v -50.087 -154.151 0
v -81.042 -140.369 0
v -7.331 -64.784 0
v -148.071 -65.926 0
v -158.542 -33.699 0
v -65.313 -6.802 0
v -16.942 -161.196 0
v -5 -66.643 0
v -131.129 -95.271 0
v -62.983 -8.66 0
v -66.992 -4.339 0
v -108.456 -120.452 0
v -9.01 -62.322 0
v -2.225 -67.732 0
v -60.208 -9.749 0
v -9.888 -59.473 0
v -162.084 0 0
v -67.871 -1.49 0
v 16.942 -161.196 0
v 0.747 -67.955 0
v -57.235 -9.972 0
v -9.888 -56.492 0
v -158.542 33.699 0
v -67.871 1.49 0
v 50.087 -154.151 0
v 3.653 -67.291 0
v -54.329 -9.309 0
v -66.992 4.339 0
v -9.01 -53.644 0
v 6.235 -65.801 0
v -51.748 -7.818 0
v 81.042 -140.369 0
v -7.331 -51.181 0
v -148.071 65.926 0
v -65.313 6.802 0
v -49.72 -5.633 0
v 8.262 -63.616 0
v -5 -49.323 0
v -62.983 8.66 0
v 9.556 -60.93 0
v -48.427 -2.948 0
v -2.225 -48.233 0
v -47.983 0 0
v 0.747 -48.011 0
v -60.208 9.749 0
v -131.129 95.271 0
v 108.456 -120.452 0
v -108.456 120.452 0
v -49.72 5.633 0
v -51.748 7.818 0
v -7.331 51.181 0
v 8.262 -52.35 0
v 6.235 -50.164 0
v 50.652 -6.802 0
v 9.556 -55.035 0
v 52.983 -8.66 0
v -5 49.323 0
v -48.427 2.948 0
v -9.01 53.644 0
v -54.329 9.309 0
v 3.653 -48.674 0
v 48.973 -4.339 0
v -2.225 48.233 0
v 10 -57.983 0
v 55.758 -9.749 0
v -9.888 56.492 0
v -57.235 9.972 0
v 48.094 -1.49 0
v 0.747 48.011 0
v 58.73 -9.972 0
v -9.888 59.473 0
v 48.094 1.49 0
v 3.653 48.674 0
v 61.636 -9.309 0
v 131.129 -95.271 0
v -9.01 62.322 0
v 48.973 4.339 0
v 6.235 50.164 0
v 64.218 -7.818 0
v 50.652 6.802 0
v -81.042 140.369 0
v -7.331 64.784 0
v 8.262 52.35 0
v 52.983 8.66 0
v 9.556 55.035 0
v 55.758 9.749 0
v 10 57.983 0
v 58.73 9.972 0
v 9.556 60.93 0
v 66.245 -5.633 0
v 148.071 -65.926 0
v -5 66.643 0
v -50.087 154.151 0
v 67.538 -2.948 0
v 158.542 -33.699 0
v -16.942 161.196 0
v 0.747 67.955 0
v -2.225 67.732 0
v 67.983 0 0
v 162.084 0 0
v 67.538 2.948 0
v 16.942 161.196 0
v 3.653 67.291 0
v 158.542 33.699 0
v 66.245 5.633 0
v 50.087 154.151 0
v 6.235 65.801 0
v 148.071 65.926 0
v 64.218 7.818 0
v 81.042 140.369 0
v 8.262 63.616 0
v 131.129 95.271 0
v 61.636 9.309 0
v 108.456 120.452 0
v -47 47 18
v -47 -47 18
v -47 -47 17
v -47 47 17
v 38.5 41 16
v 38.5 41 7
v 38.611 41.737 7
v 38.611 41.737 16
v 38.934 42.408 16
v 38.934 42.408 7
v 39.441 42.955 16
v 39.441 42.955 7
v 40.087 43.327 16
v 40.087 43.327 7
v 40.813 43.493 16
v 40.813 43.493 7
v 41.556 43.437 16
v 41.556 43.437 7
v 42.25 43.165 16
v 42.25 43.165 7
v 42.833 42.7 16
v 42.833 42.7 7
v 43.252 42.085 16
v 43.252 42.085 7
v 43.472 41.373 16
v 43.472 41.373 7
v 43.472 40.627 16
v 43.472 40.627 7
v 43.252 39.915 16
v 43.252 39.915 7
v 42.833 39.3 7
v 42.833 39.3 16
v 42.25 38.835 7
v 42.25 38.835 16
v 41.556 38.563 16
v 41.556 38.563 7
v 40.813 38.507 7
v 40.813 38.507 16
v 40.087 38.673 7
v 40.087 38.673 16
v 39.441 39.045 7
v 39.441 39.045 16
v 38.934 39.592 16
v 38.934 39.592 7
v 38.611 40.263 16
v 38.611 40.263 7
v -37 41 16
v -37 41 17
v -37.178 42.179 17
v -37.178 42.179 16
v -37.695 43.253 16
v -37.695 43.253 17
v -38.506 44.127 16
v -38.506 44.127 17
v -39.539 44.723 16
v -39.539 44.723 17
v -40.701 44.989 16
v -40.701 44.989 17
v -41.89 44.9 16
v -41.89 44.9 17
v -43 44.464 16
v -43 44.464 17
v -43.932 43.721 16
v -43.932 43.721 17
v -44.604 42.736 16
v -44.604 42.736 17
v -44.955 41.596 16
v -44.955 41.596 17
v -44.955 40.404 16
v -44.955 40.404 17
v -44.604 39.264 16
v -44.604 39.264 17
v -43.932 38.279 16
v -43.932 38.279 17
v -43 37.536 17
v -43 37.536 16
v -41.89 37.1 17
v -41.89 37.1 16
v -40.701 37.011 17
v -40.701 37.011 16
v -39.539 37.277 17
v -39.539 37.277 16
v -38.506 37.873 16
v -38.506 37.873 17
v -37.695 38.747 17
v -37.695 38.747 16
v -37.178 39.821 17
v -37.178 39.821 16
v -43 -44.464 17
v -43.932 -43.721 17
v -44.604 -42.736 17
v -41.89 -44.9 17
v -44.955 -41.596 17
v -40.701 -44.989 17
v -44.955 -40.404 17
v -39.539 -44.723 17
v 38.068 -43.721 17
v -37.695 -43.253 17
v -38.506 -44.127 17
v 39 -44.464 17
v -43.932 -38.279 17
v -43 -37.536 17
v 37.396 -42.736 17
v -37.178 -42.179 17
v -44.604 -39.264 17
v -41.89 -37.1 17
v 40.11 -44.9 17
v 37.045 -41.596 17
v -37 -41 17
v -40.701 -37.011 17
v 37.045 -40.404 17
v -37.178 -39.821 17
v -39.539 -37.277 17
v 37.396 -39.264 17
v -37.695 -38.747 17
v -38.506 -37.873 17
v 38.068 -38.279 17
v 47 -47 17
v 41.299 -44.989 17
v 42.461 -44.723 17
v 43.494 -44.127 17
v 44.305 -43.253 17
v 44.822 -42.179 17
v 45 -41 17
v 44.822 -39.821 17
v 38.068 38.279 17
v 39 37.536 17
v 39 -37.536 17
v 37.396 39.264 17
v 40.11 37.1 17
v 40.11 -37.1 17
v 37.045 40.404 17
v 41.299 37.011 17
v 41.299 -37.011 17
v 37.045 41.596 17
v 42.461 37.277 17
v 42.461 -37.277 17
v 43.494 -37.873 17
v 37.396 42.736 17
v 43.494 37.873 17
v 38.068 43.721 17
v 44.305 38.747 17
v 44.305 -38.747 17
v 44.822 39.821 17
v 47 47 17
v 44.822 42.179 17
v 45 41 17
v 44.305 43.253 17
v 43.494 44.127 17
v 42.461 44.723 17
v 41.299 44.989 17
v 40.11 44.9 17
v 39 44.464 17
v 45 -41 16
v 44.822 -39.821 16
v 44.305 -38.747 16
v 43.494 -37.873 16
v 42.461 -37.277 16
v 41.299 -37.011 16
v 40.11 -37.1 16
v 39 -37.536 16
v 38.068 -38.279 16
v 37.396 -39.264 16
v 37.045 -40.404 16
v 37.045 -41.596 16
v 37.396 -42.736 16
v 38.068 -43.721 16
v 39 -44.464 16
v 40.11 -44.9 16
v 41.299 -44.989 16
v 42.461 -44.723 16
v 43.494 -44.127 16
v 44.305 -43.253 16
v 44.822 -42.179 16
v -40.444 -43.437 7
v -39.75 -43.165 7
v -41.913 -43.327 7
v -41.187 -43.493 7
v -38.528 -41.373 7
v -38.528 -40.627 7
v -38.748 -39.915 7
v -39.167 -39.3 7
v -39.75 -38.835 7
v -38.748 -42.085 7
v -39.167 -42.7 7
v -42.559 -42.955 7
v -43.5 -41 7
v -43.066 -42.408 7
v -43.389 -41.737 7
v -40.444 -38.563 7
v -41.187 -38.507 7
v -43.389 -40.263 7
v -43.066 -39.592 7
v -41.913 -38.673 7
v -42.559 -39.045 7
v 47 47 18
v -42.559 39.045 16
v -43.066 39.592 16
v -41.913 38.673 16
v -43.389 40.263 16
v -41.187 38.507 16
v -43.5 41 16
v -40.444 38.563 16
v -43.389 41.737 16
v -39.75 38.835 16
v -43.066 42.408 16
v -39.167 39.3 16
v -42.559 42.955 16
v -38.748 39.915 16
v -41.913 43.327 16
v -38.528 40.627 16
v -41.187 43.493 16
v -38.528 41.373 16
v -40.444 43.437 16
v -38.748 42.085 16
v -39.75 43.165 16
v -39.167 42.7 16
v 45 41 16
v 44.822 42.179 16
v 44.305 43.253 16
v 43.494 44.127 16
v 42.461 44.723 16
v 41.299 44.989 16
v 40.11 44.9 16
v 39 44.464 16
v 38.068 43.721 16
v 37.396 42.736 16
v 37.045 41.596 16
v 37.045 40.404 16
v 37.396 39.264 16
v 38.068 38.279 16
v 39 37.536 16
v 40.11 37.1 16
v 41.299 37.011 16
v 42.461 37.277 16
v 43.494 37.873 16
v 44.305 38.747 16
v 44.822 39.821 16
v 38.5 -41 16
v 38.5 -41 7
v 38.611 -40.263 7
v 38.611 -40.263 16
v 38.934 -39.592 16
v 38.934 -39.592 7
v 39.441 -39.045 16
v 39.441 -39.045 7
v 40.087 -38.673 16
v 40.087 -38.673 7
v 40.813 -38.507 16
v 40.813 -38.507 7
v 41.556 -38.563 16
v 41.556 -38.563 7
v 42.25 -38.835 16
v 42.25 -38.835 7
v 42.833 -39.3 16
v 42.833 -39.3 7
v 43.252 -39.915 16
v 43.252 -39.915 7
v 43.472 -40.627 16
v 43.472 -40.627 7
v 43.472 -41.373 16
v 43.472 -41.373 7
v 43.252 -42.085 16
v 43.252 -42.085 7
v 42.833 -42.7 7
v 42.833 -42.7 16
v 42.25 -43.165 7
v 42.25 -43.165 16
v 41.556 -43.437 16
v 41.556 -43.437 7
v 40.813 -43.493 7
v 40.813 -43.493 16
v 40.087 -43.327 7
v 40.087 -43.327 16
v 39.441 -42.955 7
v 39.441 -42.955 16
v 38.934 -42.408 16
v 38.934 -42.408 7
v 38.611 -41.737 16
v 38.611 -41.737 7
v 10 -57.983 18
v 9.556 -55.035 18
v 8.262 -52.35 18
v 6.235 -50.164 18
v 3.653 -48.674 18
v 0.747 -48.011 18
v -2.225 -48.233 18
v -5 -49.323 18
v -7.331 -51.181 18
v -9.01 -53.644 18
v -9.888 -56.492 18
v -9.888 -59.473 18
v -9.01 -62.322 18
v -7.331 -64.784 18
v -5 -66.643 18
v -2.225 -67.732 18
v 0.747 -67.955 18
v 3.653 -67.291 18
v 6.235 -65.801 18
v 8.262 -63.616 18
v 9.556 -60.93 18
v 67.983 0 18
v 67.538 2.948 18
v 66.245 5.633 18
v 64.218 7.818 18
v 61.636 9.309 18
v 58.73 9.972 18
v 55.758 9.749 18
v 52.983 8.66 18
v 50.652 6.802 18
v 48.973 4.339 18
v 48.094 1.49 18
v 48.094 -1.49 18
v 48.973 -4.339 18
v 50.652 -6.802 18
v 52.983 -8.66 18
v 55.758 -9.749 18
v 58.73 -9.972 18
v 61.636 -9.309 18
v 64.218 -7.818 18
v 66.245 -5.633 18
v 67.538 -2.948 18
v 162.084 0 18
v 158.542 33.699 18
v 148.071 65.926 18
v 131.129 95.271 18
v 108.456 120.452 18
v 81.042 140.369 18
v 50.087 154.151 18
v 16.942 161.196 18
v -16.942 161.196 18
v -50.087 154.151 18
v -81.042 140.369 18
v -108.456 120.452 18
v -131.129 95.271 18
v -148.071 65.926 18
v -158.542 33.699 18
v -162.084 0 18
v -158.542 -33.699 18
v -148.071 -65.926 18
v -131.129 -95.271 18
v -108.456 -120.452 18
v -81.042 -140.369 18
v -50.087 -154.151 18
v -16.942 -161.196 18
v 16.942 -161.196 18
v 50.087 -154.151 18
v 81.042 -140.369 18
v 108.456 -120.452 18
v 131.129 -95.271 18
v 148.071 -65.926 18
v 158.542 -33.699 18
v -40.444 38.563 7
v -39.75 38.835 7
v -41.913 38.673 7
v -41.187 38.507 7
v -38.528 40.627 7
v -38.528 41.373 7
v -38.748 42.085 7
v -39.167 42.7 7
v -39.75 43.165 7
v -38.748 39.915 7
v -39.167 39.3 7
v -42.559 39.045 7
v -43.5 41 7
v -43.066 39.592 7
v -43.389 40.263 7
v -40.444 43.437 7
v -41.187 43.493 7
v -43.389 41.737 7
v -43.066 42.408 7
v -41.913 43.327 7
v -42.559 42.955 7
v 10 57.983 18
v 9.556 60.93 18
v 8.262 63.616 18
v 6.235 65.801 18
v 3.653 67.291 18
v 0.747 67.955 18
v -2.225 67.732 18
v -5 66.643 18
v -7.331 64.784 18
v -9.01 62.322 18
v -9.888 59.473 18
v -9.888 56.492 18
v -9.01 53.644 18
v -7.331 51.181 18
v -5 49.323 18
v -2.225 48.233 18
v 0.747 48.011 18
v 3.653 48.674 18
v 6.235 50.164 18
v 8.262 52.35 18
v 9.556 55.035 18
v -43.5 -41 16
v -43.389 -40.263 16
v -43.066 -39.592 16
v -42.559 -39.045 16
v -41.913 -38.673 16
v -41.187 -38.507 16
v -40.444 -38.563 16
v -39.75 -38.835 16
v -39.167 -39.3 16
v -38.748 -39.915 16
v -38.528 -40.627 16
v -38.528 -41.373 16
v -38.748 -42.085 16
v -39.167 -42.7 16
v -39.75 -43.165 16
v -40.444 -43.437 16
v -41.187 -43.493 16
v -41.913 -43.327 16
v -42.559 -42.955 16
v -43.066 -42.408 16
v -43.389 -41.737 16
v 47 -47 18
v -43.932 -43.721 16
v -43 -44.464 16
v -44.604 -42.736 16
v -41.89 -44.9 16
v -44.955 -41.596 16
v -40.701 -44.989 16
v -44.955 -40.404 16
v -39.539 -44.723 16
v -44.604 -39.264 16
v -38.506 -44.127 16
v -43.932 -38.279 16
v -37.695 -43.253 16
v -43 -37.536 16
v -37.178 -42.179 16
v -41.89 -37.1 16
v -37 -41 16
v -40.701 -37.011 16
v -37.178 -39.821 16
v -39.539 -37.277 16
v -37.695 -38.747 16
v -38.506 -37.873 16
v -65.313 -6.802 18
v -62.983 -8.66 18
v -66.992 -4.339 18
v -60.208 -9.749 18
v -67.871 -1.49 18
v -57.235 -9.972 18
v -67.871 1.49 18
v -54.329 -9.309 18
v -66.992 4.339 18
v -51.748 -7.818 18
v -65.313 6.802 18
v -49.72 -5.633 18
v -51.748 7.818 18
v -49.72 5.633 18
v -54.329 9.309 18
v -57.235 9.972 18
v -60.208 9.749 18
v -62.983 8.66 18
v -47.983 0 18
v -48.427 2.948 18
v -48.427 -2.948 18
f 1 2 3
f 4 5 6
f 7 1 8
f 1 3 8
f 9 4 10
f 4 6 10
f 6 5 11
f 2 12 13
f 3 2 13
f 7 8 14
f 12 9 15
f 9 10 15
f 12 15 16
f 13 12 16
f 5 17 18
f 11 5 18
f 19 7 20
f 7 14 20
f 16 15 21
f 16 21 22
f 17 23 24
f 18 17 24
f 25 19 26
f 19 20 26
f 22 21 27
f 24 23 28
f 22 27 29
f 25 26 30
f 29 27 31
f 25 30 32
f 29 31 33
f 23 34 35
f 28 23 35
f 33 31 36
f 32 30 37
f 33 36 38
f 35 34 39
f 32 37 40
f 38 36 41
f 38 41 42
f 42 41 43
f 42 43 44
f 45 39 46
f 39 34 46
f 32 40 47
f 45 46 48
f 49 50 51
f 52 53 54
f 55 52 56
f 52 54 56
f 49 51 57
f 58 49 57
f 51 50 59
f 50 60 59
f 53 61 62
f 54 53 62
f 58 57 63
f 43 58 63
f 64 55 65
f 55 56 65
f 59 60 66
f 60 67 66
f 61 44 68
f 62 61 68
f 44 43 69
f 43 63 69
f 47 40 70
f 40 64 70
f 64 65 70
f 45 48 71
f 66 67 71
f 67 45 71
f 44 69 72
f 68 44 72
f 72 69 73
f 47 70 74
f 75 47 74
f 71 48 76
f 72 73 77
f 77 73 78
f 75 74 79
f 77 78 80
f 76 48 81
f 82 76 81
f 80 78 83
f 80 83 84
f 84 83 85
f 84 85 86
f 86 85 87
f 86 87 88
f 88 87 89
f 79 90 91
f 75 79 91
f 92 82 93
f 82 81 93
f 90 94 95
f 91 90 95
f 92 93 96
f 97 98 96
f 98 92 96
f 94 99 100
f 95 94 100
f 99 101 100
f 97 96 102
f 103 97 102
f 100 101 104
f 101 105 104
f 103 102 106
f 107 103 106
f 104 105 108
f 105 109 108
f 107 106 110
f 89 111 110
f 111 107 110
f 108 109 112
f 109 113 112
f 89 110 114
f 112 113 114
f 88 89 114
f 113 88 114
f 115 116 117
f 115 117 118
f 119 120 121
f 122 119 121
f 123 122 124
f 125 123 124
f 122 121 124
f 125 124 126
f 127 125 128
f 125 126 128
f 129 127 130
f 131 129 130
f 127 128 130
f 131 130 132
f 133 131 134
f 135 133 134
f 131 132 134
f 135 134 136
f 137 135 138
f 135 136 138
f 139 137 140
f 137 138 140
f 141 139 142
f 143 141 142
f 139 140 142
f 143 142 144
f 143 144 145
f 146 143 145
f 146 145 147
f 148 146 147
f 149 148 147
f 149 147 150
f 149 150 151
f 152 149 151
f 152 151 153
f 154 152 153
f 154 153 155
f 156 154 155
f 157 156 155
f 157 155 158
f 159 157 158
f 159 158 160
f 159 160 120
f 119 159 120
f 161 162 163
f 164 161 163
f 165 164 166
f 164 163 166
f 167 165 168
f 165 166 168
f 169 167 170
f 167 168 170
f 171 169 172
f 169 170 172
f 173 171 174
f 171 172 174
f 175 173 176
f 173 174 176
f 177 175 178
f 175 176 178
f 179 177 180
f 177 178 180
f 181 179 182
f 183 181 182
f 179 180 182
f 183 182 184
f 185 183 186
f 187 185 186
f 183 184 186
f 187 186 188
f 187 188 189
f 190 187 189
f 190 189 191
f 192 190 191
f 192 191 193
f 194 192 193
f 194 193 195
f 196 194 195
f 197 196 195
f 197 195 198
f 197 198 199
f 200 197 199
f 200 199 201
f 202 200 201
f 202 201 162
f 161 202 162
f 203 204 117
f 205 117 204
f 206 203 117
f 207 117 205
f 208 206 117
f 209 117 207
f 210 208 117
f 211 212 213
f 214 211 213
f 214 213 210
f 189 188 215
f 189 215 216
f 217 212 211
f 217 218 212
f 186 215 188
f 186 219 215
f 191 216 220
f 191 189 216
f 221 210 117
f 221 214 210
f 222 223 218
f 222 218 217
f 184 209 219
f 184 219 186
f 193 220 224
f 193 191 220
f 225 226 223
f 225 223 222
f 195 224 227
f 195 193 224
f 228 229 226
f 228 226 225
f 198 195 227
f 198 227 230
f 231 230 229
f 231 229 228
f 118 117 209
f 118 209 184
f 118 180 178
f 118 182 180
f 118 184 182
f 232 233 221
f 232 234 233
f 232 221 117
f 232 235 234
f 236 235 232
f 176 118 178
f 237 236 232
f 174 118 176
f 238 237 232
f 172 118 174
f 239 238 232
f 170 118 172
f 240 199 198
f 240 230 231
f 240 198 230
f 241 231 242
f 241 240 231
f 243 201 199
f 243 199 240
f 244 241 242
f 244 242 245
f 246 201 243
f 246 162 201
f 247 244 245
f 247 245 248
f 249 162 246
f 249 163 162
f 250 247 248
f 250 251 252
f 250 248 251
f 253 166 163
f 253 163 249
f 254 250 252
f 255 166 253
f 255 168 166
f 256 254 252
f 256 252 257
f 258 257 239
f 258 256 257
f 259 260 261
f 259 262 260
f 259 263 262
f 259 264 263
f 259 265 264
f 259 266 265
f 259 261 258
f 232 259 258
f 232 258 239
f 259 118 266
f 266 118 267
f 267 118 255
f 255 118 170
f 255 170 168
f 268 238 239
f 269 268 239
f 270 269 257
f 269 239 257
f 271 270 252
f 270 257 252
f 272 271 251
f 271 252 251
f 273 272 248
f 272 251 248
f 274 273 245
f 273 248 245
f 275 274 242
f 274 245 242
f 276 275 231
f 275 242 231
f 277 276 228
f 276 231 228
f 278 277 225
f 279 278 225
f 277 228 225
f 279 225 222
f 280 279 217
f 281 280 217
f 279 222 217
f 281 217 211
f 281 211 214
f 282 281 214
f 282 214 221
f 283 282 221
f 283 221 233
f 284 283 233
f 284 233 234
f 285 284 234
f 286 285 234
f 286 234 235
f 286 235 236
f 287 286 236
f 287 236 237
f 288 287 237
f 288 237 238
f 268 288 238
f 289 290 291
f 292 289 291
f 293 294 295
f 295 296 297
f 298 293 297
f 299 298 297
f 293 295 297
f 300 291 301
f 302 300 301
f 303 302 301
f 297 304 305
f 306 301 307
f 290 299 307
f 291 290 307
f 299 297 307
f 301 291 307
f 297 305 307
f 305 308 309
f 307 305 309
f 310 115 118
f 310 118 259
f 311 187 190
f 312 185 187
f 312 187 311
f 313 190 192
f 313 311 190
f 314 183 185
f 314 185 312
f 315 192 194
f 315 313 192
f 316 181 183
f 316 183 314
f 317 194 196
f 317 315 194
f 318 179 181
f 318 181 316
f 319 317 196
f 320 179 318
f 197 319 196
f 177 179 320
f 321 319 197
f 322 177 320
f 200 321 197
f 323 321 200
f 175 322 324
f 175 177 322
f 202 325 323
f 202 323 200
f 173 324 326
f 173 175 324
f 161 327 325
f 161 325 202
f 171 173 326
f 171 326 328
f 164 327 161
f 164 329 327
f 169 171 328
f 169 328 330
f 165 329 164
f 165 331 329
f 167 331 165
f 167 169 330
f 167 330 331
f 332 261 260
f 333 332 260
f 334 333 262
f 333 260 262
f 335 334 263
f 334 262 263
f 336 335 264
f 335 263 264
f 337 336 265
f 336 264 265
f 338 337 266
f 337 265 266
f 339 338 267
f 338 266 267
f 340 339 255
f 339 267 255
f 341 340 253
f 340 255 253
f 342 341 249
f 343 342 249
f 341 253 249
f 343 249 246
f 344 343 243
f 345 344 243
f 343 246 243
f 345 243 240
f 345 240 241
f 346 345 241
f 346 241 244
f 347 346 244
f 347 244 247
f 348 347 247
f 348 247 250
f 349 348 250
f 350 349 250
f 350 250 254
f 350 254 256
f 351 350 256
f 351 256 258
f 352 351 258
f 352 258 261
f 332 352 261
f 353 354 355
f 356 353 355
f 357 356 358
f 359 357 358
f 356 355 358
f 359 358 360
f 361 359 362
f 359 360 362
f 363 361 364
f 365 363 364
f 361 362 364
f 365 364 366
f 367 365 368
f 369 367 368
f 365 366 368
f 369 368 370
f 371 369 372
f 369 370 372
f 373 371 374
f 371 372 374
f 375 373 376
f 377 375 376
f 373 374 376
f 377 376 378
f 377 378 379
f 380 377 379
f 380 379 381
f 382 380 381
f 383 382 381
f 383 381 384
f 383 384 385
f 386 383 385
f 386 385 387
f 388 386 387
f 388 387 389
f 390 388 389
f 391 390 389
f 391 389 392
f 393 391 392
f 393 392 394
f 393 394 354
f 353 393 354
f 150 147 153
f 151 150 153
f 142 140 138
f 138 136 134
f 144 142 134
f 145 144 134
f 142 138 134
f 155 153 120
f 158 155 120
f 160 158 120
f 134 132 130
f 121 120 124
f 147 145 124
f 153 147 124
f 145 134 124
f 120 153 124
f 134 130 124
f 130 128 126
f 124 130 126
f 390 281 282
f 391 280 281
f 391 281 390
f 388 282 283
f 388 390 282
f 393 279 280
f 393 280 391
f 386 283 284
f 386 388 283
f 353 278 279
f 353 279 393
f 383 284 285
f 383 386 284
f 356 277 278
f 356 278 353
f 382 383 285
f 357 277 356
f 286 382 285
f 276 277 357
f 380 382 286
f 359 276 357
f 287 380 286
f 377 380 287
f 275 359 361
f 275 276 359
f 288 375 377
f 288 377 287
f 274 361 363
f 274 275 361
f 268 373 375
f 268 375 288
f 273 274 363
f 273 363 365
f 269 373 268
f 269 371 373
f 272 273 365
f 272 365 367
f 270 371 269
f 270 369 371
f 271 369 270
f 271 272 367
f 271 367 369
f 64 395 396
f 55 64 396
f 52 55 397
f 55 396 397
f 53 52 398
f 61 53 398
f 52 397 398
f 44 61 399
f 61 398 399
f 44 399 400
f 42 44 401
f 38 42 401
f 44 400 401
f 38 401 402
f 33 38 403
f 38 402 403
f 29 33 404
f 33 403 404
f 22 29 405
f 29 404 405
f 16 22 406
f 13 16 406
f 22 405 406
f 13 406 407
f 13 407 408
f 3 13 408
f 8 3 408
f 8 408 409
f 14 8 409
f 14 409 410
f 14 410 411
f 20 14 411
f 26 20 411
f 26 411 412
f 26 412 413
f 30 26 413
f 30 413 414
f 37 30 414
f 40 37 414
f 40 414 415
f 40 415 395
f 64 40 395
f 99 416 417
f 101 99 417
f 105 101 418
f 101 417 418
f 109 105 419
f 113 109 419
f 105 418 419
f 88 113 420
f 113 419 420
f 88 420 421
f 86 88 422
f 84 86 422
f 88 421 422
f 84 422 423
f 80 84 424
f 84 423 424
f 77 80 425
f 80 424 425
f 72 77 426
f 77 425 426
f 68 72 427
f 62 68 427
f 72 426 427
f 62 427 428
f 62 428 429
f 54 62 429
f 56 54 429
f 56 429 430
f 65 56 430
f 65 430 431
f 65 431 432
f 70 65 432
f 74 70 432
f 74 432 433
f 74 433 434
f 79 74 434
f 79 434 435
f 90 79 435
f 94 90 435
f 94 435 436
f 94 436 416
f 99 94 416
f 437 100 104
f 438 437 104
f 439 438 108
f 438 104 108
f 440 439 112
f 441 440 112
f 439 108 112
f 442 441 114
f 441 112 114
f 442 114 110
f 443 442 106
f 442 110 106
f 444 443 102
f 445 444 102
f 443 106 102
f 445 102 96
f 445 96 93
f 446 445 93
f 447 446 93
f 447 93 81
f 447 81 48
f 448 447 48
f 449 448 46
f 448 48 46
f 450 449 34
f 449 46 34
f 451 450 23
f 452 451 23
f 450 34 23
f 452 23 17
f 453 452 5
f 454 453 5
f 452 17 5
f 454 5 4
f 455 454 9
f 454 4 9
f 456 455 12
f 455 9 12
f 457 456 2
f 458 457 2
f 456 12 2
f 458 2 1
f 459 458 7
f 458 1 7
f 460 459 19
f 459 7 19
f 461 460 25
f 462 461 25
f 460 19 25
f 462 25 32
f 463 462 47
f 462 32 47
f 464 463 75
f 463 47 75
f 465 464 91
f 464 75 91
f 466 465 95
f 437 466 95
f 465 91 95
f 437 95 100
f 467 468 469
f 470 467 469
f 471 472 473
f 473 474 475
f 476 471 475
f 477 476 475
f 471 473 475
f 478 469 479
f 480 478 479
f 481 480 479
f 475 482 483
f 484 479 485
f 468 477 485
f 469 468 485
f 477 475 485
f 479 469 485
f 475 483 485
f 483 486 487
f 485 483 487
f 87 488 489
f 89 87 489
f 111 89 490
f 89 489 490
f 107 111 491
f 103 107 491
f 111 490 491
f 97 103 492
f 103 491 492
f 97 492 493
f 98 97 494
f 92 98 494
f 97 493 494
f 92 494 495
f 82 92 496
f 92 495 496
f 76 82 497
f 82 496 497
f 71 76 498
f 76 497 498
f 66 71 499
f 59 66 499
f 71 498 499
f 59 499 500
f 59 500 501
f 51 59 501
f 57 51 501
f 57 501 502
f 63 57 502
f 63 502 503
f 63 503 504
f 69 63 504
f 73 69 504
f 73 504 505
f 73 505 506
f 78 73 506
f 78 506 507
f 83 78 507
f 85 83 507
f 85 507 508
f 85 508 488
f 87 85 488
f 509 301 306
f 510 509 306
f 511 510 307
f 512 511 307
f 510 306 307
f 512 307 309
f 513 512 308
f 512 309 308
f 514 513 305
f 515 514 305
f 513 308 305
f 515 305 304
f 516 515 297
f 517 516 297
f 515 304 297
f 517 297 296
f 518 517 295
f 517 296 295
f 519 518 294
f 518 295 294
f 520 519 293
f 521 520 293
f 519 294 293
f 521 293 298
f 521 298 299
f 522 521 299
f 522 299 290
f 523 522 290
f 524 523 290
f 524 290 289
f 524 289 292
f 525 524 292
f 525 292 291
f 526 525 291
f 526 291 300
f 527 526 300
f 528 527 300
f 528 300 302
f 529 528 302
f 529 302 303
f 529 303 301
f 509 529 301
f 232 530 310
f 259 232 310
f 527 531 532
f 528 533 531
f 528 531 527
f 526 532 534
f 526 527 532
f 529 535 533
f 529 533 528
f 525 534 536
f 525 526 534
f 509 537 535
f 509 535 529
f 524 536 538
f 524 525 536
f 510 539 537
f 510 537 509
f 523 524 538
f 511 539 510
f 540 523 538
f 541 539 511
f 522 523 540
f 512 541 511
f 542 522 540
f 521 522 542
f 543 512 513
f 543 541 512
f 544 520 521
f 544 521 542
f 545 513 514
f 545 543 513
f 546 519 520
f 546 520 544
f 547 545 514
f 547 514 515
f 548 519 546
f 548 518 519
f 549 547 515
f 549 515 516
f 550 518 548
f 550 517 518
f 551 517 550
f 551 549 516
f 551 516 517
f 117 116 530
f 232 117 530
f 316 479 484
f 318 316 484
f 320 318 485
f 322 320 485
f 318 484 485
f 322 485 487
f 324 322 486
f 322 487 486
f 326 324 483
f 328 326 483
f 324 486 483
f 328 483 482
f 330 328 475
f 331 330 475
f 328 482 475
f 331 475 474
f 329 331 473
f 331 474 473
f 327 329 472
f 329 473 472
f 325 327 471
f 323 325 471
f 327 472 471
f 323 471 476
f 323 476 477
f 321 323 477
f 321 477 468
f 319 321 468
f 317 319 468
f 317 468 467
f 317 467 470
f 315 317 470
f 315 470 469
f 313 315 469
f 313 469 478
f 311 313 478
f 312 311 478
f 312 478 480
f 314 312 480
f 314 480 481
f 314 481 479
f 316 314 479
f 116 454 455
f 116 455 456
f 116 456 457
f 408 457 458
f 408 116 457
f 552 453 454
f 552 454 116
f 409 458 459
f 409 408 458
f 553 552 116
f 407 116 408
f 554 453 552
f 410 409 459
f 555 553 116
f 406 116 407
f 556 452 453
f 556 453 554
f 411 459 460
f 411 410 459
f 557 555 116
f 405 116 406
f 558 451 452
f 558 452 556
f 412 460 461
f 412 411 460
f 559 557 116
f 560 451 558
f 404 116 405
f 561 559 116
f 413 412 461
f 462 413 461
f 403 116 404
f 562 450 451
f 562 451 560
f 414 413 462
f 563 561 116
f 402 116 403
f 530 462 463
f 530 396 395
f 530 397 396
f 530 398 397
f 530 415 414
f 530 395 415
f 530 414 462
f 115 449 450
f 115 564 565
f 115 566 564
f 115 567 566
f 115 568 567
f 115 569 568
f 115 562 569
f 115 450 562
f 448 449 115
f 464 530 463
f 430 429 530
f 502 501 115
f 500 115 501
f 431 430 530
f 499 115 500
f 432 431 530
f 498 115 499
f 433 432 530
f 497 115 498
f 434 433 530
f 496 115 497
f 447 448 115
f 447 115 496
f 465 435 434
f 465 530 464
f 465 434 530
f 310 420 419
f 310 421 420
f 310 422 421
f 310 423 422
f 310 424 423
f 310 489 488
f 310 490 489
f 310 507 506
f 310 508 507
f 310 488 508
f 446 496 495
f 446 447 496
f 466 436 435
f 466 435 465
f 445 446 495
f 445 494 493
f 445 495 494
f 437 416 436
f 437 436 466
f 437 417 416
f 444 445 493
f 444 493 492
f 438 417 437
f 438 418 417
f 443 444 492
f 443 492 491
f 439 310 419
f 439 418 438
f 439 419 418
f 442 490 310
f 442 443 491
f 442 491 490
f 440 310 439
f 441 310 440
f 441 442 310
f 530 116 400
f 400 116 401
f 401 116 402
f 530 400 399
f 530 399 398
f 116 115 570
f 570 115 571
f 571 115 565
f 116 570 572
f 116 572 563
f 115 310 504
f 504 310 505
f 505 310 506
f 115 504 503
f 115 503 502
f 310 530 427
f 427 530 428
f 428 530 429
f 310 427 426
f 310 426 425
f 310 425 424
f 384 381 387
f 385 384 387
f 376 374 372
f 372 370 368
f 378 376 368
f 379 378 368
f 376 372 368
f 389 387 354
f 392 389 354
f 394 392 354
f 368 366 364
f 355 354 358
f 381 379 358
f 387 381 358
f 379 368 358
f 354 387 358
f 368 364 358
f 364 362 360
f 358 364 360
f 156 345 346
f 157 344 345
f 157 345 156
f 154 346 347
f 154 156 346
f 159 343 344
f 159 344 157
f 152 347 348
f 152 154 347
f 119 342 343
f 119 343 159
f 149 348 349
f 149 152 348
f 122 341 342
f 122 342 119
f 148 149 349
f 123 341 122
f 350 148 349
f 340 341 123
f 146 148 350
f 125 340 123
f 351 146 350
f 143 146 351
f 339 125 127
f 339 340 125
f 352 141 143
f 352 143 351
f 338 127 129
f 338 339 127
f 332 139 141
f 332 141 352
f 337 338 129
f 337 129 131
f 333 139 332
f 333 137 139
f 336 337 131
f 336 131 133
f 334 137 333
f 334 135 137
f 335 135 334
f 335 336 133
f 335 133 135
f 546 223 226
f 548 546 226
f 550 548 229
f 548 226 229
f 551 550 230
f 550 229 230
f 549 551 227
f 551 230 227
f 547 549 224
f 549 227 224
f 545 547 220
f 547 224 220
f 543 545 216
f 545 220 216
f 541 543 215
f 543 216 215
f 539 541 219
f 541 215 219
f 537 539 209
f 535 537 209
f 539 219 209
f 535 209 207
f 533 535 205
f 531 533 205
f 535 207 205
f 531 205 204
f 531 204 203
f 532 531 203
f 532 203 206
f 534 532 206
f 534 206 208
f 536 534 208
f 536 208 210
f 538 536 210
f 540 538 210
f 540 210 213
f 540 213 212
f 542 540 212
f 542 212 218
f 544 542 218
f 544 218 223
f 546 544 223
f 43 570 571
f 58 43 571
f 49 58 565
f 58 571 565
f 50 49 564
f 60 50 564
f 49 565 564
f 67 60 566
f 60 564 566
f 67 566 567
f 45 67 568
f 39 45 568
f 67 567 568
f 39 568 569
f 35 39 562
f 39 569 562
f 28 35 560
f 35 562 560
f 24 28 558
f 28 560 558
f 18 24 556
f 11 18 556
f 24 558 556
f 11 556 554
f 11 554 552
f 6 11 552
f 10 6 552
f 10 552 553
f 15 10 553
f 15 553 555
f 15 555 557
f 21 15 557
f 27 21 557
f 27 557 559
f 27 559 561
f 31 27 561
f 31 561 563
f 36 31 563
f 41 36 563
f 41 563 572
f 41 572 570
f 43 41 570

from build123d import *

# Parameters (mm, degrees)
SKETCH003_R      = 162.0844056183
PAD002_DEPTH     = 18
SKETCH009_W      = 94
SKETCH009_H      = 94
POCKET002_DEPTH  = 1
HOLE_D           = 5
HOLE_DEPTH       = 10
HOLE_CBORE_D     = 8
HOLE_CBORE_DEPTH = 1
SKETCH011_R      = 10
POCKET003_DEPTH  = 18.001


with BuildPart() as part:
    # Sketch003 → Pad002 (new body)
    with BuildSketch(Plane.XY):
        Circle(SKETCH003_R)
    extrude(amount=PAD002_DEPTH)

    # Sketch009 (on Face3 of Pad002) → Pocket002 (cut)
    with BuildSketch(Plane.XY.offset(18)):
        Rectangle(SKETCH009_W, SKETCH009_H)
    extrude(amount=-POCKET002_DEPTH, mode=Mode.SUBTRACT)

    # Hole
    with Locations(Plane.XY.offset(17)):
        with Locations((-41, 41), (41, 41), (-41, -41), (41, -41)):
            CounterBoreHole(HOLE_D / 2, HOLE_CBORE_D / 2, HOLE_CBORE_DEPTH, depth=HOLE_DEPTH)

    # Sketch011 (on Face3 of Hole) → Pocket003 (cut, through all)
    with BuildSketch(Plane.XY.offset(18)):
        with Locations((-57.9827560573, 0)):
            Circle(SKETCH011_R)
        with Locations((0, 57.9827560573)):
            Circle(SKETCH011_R)
        with Locations((57.9827560573, 0)):
            Circle(SKETCH011_R)
        with Locations((0, -57.9827560573)):
            Circle(SKETCH011_R)
    extrude(amount=-POCKET003_DEPTH, mode=Mode.SUBTRACT)


with BuildPart() as part_1:
    # Clone004 placement: moved
    add(part.part.moved(Location((0, 0, -24))))


with BuildPart() as part_2:
    # Clone015 placement: moved
    add(part_1.part.moved(Location((0, 0, 24))))


solid = part_2.part
